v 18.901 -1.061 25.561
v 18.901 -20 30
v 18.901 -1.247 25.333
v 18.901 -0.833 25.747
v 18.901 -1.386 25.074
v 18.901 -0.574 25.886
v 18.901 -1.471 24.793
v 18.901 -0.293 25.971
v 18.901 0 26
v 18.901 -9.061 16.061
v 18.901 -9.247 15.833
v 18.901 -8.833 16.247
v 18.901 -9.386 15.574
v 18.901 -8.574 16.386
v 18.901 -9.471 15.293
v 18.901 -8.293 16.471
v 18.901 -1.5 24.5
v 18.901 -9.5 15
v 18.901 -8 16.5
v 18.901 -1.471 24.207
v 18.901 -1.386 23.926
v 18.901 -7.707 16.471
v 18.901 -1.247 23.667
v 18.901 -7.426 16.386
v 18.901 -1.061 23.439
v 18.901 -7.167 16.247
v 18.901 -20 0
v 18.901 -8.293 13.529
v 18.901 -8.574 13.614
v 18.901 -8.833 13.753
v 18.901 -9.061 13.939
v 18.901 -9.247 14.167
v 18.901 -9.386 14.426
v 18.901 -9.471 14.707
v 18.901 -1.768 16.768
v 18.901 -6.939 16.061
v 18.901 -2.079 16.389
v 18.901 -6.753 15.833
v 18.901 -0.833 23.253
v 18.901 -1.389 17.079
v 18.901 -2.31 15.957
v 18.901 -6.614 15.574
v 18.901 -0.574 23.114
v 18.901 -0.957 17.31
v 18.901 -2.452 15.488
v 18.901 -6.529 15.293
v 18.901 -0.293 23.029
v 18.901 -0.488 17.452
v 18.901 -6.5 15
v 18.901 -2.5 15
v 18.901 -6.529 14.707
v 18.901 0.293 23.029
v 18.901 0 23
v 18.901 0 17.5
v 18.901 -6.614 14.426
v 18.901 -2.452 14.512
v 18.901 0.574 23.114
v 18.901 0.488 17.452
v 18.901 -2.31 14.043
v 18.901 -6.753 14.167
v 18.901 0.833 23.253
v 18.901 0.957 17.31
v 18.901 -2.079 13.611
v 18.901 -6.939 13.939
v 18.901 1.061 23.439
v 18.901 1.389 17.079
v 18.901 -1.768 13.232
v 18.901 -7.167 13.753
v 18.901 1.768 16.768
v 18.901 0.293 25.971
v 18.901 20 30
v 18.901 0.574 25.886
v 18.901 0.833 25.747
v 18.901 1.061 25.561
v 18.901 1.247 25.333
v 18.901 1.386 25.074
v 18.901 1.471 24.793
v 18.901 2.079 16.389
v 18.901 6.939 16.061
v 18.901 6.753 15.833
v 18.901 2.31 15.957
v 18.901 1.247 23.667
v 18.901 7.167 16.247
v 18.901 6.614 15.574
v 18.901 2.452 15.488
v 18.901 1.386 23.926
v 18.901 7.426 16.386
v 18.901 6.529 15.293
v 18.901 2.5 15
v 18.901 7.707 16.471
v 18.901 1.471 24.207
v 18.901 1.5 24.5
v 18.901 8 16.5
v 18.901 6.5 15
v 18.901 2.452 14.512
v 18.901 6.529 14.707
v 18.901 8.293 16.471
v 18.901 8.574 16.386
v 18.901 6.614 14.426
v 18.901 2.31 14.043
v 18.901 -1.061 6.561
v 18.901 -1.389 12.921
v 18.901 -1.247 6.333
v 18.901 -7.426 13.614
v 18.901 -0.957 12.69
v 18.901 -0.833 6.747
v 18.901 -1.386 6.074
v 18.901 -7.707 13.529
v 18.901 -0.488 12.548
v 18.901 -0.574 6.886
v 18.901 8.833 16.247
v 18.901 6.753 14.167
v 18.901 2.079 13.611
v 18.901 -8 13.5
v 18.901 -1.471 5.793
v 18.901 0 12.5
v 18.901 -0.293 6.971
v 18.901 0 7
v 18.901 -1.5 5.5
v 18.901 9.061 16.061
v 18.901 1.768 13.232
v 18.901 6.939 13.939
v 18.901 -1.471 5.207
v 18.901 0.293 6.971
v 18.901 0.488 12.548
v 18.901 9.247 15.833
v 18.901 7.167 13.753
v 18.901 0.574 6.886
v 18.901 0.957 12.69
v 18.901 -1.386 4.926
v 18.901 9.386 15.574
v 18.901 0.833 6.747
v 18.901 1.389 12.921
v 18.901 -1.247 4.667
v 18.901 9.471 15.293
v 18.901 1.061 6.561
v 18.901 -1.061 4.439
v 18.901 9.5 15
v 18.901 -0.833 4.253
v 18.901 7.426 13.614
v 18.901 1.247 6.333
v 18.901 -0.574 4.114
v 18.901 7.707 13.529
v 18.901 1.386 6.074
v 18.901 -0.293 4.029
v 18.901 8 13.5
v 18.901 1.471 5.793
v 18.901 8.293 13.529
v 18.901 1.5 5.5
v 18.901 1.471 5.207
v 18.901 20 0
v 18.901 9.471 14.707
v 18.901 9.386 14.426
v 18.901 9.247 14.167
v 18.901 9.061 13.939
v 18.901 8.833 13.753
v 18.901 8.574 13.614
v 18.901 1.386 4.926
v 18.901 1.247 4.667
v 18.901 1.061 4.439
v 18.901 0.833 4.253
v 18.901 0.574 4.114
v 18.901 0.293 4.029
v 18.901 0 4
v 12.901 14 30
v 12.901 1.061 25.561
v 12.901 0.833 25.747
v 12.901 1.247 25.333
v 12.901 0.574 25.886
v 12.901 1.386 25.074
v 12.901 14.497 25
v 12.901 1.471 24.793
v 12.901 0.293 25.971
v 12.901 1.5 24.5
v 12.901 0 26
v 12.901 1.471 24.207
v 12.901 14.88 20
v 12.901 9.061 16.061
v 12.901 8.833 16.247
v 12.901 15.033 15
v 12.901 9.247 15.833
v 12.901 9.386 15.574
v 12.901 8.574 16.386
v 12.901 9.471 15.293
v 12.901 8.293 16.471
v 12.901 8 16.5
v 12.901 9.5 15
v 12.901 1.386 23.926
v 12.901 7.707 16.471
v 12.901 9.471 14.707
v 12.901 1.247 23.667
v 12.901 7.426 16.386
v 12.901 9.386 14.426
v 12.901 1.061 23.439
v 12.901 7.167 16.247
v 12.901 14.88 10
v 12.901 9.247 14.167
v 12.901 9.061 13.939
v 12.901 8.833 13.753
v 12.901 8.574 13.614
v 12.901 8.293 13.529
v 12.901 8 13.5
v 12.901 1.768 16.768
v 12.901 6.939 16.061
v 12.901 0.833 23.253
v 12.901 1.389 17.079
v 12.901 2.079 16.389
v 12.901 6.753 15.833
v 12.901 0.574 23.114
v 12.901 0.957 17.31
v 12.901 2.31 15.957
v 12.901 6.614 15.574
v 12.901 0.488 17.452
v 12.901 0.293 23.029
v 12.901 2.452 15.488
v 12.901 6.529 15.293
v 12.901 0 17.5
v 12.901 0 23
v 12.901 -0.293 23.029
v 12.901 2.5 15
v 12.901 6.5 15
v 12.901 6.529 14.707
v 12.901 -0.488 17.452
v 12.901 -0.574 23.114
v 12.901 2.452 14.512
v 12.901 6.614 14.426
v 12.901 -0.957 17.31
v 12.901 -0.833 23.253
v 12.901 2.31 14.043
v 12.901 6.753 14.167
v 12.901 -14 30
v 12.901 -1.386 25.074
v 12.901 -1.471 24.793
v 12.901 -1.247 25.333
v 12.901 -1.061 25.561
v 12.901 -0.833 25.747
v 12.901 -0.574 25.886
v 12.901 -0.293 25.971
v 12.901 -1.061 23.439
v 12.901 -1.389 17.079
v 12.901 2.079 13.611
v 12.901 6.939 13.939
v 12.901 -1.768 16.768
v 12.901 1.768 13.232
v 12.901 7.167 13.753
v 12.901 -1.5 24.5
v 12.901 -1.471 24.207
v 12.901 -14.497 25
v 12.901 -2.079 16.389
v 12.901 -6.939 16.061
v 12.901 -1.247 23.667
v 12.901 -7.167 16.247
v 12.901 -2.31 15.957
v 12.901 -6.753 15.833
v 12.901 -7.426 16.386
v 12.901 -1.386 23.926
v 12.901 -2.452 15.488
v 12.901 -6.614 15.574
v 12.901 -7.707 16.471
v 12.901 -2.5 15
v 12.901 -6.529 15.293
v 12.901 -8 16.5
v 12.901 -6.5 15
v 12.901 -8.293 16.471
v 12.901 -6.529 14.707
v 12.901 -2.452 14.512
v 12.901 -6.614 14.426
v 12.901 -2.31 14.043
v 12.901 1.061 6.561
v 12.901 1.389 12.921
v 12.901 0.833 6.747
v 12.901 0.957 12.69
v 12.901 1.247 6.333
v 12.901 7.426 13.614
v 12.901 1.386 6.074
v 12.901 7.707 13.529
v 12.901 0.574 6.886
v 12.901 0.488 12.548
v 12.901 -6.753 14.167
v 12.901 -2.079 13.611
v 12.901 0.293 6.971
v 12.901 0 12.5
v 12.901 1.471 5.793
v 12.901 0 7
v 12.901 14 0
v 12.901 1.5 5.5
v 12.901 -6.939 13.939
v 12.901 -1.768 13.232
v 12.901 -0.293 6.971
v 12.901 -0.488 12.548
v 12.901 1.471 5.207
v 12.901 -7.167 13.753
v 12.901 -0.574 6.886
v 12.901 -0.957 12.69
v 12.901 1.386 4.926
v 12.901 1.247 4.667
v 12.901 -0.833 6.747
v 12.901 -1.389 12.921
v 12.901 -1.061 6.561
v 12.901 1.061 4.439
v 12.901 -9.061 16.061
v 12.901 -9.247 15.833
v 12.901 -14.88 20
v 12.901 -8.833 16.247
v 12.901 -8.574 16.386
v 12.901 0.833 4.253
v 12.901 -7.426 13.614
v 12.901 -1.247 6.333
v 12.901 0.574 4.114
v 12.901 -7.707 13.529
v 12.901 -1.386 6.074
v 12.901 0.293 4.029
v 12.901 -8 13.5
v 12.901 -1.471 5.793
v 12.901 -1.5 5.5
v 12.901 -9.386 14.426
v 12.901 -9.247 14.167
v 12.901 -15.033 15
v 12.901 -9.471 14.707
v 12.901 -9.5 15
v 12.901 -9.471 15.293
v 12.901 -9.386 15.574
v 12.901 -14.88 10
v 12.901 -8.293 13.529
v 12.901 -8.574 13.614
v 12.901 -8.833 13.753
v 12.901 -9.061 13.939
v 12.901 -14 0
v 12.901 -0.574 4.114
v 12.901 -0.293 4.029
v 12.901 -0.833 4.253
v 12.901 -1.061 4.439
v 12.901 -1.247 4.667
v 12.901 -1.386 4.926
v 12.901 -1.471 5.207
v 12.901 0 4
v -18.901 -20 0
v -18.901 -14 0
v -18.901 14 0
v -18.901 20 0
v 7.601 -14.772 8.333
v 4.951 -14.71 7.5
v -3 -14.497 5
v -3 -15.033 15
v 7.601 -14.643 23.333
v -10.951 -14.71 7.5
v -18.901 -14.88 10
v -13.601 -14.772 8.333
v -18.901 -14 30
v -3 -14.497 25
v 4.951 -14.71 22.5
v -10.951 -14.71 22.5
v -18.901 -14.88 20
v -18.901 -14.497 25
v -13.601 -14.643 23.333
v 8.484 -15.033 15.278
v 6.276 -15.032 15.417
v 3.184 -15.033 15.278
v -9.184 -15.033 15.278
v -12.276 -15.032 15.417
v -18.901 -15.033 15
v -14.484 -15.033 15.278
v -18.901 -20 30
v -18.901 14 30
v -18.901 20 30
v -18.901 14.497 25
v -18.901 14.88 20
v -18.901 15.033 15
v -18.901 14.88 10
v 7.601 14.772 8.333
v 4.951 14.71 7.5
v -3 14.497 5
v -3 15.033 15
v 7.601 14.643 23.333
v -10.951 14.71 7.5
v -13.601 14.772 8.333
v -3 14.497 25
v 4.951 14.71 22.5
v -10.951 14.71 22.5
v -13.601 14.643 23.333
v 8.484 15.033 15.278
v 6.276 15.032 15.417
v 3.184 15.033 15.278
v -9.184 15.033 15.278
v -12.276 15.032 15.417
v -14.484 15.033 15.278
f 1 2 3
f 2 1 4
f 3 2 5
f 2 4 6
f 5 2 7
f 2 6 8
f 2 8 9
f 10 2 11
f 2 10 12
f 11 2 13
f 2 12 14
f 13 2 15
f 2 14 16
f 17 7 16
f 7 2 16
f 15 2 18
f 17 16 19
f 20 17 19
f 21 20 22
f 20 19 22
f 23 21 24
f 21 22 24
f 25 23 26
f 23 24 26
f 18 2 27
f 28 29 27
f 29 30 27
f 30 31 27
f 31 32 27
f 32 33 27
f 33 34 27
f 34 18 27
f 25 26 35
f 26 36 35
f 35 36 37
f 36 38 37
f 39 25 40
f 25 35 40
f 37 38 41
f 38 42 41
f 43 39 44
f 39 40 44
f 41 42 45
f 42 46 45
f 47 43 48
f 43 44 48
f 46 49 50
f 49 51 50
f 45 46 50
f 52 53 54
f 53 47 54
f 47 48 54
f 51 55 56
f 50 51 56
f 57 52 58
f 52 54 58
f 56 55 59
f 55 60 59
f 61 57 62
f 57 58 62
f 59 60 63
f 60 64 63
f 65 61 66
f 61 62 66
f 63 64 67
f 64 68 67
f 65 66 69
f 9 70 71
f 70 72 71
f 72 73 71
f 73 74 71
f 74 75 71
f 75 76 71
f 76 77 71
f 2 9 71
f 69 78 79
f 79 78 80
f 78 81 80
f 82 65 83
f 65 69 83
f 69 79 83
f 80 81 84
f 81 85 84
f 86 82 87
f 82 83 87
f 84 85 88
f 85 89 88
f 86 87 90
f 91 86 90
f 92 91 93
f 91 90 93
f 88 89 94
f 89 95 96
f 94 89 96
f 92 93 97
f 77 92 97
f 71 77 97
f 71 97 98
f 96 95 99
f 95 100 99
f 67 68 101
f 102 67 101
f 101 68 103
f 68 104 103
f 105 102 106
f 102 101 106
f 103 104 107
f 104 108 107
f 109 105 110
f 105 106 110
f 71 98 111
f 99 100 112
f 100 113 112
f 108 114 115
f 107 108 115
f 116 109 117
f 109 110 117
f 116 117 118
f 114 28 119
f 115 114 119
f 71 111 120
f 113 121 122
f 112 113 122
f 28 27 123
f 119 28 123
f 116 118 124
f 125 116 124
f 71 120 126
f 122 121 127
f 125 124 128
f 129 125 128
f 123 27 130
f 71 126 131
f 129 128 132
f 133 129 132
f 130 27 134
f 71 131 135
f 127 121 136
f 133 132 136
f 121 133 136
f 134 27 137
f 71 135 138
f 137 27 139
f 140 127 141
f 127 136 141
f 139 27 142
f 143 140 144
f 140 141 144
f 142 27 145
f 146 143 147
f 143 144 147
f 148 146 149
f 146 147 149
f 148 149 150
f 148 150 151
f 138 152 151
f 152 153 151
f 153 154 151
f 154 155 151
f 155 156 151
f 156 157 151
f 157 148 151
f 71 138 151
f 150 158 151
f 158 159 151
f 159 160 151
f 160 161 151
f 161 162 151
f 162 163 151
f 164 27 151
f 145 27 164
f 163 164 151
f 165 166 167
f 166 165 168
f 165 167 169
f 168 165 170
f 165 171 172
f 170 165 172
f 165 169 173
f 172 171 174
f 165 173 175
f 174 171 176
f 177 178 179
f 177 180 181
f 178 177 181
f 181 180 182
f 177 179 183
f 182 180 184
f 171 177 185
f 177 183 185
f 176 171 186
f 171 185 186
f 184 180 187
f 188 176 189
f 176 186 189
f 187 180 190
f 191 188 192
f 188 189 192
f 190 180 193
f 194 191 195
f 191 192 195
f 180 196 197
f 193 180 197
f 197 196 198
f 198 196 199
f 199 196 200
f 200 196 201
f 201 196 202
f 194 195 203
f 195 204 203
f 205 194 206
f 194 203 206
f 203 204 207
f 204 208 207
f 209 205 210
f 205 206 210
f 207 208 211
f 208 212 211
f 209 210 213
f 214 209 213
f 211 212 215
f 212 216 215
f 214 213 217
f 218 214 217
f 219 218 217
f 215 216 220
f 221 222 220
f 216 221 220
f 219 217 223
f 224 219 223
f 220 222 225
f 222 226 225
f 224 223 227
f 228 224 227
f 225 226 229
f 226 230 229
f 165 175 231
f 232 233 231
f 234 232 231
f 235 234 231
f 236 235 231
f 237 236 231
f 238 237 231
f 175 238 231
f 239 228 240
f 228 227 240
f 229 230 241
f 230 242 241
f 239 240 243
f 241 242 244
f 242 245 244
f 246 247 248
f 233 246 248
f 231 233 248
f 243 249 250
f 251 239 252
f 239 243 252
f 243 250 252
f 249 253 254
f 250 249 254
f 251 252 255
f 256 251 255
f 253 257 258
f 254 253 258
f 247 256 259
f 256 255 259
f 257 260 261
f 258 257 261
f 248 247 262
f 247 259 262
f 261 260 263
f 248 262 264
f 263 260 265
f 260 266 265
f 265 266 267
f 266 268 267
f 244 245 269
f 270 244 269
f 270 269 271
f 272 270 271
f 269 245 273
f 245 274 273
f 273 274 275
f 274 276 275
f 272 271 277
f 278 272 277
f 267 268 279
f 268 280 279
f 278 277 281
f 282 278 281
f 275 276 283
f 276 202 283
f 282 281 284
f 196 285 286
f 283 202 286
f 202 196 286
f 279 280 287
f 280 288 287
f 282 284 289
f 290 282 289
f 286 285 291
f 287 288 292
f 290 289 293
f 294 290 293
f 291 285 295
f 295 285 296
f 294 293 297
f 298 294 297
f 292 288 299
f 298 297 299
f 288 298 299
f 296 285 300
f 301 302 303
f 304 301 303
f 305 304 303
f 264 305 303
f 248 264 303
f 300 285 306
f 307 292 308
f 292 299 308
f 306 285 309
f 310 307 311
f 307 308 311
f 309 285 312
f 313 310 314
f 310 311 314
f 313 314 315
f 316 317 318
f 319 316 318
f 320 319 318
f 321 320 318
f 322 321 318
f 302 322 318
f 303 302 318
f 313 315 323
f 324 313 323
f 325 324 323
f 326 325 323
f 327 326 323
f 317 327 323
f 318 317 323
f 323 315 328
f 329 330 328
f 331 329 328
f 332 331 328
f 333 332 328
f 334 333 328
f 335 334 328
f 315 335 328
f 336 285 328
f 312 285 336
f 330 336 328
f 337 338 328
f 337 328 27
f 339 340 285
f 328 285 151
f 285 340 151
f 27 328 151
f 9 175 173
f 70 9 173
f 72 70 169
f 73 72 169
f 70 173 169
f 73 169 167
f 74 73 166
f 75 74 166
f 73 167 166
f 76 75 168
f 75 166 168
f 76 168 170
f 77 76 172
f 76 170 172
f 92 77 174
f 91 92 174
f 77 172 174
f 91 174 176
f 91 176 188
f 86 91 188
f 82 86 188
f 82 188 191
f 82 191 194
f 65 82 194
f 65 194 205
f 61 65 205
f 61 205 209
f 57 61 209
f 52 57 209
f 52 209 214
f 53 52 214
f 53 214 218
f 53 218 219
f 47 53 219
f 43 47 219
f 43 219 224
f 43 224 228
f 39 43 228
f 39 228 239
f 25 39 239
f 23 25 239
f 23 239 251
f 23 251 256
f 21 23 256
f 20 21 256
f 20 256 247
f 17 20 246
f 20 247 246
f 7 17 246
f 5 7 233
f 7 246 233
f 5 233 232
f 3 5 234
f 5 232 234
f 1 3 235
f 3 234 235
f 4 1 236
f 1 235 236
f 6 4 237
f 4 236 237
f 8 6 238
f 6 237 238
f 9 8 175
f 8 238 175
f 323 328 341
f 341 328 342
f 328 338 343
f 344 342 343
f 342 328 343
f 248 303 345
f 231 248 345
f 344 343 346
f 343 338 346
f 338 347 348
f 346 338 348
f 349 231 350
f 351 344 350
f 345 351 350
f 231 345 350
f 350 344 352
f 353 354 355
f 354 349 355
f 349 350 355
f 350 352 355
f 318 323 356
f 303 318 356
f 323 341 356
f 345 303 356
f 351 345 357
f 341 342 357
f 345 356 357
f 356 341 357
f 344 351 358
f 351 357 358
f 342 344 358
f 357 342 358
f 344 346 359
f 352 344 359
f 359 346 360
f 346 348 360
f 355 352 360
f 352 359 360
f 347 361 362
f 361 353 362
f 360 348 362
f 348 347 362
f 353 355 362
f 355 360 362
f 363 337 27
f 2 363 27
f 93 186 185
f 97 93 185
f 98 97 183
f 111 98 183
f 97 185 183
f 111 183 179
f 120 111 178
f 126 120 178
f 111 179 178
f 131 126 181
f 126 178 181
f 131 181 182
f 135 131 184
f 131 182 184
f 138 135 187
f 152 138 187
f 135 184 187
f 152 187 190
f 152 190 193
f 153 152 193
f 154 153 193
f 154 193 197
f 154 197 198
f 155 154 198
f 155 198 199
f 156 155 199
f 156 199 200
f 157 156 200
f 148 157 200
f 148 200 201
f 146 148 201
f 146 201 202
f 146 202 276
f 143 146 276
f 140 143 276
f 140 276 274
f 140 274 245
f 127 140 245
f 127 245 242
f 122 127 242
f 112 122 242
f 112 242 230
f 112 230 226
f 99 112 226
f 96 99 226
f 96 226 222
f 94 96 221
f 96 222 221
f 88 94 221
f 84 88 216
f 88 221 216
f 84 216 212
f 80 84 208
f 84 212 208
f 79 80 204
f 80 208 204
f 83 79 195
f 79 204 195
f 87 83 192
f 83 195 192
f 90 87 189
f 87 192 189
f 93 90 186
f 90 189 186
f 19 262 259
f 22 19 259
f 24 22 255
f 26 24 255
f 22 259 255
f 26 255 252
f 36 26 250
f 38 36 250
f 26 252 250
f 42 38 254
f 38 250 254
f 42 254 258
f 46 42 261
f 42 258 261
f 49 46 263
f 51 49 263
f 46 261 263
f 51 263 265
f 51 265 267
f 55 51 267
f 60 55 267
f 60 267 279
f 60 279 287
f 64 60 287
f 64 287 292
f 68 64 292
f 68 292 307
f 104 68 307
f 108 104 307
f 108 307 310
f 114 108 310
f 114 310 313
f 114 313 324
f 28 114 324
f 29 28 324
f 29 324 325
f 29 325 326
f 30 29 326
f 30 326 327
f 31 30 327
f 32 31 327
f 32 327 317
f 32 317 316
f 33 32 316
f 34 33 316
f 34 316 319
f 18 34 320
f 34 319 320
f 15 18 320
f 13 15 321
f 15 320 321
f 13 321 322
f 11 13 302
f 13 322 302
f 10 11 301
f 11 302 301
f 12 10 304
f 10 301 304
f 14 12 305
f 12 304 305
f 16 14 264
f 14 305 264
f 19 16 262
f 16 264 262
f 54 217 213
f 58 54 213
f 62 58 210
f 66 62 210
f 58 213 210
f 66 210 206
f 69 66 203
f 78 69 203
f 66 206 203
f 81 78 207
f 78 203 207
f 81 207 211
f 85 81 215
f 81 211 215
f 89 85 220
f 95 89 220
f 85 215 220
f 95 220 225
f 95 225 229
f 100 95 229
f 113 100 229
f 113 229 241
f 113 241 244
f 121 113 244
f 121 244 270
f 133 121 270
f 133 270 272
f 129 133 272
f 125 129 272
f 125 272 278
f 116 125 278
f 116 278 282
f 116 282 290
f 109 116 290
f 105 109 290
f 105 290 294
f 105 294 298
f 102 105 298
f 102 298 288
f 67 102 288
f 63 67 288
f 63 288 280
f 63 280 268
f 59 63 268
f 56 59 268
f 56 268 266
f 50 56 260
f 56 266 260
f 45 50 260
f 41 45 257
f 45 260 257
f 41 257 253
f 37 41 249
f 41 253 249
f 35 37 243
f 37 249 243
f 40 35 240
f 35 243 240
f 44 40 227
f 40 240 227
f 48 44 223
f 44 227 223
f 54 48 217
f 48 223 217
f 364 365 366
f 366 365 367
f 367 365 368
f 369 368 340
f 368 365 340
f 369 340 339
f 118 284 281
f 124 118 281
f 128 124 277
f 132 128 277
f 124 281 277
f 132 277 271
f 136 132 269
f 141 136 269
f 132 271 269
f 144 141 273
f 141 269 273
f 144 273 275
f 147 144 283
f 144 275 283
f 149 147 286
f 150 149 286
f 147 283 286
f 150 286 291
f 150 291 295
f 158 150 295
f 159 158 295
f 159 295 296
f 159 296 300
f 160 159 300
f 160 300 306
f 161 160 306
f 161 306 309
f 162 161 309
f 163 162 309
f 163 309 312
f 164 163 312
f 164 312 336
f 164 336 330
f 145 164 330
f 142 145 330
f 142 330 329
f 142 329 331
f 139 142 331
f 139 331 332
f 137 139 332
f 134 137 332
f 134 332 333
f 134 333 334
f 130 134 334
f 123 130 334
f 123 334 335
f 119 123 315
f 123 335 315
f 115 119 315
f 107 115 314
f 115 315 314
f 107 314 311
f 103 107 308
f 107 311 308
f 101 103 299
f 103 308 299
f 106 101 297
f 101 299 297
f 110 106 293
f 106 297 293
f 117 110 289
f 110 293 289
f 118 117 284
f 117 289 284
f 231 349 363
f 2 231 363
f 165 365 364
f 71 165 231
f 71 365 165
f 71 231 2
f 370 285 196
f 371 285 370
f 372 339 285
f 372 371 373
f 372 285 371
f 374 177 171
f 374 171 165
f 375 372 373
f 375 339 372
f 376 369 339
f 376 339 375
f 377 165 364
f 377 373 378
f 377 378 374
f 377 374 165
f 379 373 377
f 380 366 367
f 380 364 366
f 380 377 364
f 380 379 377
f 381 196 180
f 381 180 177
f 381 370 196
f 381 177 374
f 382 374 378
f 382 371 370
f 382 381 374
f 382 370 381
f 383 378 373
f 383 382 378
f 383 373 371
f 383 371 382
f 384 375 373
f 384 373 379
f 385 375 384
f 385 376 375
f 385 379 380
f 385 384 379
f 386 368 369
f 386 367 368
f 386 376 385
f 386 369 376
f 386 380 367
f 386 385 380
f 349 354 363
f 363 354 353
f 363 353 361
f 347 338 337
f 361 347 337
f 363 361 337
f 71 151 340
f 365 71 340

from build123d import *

# Parameters (mm, degrees)
BOSS_EXTRUDE1_DEPTH = 30
SKETCH4_R           = 1.5
SKETCH4_R_2         = 2.5
CUT_EXTRUDE1_DEPTH  = 49.076771644
CUT_EXTRUDE3_DEPTH  = 31.802137849


with BuildPart() as part:
    # Sketch2 → Boss-Extrude1 (new body)
    with BuildSketch(Plane.XY):
        Polygon((-18.901068924, 20), (-18.901068924, 14), (12.901068924, 14), (12.901068924, -14), (-18.901068924, -14), (-18.901068924, -20), (18.901068924, -20), (18.901068924, 20), align=None)
    extrude(amount=BOSS_EXTRUDE1_DEPTH)

    # Sketch4 → Cut-Extrude1 (cut, through all)
    with BuildSketch(Plane.ZY.offset(-12.901068924)):
        with Locations((15, 8)):
            Circle(SKETCH4_R)
        with Locations((15, 0)):
            Circle(SKETCH4_R_2)
        with Locations((15, -8)):
            Circle(SKETCH4_R)
        with Locations((5.5, 0)):
            Circle(SKETCH4_R)
        with Locations((24.5, 0)):
            Circle(SKETCH4_R)
    extrude(amount=-CUT_EXTRUDE1_DEPTH, mode=Mode.SUBTRACT)

    # Sketch7 → Cut-Extrude3 (cut)
    with BuildSketch(Plane.ZY.offset(18.901068924)):
        with BuildLine():
            Line((0, -14), (30, -14))
            add(Edge.make_bspline(
                [(0, -14), (5, -14.51661298), (15, -15.549838941), (25, -14.51661298), (30, -14)],
                knots=[0, 0, 0, 0, 0.5, 1, 1, 1, 1], degree=3))
        make_face()
        with BuildLine():
            Line((0, 14), (30, 14))
            add(Edge.make_bspline(
                [(0, 14), (5, 14.51661298), (15, 15.549838941), (25, 14.51661298), (30, 14)],
                knots=[0, 0, 0, 0, 0.5, 1, 1, 1, 1], degree=3))
        make_face()
    extrude(amount=-CUT_EXTRUDE3_DEPTH, mode=Mode.SUBTRACT)


solid = part.part
